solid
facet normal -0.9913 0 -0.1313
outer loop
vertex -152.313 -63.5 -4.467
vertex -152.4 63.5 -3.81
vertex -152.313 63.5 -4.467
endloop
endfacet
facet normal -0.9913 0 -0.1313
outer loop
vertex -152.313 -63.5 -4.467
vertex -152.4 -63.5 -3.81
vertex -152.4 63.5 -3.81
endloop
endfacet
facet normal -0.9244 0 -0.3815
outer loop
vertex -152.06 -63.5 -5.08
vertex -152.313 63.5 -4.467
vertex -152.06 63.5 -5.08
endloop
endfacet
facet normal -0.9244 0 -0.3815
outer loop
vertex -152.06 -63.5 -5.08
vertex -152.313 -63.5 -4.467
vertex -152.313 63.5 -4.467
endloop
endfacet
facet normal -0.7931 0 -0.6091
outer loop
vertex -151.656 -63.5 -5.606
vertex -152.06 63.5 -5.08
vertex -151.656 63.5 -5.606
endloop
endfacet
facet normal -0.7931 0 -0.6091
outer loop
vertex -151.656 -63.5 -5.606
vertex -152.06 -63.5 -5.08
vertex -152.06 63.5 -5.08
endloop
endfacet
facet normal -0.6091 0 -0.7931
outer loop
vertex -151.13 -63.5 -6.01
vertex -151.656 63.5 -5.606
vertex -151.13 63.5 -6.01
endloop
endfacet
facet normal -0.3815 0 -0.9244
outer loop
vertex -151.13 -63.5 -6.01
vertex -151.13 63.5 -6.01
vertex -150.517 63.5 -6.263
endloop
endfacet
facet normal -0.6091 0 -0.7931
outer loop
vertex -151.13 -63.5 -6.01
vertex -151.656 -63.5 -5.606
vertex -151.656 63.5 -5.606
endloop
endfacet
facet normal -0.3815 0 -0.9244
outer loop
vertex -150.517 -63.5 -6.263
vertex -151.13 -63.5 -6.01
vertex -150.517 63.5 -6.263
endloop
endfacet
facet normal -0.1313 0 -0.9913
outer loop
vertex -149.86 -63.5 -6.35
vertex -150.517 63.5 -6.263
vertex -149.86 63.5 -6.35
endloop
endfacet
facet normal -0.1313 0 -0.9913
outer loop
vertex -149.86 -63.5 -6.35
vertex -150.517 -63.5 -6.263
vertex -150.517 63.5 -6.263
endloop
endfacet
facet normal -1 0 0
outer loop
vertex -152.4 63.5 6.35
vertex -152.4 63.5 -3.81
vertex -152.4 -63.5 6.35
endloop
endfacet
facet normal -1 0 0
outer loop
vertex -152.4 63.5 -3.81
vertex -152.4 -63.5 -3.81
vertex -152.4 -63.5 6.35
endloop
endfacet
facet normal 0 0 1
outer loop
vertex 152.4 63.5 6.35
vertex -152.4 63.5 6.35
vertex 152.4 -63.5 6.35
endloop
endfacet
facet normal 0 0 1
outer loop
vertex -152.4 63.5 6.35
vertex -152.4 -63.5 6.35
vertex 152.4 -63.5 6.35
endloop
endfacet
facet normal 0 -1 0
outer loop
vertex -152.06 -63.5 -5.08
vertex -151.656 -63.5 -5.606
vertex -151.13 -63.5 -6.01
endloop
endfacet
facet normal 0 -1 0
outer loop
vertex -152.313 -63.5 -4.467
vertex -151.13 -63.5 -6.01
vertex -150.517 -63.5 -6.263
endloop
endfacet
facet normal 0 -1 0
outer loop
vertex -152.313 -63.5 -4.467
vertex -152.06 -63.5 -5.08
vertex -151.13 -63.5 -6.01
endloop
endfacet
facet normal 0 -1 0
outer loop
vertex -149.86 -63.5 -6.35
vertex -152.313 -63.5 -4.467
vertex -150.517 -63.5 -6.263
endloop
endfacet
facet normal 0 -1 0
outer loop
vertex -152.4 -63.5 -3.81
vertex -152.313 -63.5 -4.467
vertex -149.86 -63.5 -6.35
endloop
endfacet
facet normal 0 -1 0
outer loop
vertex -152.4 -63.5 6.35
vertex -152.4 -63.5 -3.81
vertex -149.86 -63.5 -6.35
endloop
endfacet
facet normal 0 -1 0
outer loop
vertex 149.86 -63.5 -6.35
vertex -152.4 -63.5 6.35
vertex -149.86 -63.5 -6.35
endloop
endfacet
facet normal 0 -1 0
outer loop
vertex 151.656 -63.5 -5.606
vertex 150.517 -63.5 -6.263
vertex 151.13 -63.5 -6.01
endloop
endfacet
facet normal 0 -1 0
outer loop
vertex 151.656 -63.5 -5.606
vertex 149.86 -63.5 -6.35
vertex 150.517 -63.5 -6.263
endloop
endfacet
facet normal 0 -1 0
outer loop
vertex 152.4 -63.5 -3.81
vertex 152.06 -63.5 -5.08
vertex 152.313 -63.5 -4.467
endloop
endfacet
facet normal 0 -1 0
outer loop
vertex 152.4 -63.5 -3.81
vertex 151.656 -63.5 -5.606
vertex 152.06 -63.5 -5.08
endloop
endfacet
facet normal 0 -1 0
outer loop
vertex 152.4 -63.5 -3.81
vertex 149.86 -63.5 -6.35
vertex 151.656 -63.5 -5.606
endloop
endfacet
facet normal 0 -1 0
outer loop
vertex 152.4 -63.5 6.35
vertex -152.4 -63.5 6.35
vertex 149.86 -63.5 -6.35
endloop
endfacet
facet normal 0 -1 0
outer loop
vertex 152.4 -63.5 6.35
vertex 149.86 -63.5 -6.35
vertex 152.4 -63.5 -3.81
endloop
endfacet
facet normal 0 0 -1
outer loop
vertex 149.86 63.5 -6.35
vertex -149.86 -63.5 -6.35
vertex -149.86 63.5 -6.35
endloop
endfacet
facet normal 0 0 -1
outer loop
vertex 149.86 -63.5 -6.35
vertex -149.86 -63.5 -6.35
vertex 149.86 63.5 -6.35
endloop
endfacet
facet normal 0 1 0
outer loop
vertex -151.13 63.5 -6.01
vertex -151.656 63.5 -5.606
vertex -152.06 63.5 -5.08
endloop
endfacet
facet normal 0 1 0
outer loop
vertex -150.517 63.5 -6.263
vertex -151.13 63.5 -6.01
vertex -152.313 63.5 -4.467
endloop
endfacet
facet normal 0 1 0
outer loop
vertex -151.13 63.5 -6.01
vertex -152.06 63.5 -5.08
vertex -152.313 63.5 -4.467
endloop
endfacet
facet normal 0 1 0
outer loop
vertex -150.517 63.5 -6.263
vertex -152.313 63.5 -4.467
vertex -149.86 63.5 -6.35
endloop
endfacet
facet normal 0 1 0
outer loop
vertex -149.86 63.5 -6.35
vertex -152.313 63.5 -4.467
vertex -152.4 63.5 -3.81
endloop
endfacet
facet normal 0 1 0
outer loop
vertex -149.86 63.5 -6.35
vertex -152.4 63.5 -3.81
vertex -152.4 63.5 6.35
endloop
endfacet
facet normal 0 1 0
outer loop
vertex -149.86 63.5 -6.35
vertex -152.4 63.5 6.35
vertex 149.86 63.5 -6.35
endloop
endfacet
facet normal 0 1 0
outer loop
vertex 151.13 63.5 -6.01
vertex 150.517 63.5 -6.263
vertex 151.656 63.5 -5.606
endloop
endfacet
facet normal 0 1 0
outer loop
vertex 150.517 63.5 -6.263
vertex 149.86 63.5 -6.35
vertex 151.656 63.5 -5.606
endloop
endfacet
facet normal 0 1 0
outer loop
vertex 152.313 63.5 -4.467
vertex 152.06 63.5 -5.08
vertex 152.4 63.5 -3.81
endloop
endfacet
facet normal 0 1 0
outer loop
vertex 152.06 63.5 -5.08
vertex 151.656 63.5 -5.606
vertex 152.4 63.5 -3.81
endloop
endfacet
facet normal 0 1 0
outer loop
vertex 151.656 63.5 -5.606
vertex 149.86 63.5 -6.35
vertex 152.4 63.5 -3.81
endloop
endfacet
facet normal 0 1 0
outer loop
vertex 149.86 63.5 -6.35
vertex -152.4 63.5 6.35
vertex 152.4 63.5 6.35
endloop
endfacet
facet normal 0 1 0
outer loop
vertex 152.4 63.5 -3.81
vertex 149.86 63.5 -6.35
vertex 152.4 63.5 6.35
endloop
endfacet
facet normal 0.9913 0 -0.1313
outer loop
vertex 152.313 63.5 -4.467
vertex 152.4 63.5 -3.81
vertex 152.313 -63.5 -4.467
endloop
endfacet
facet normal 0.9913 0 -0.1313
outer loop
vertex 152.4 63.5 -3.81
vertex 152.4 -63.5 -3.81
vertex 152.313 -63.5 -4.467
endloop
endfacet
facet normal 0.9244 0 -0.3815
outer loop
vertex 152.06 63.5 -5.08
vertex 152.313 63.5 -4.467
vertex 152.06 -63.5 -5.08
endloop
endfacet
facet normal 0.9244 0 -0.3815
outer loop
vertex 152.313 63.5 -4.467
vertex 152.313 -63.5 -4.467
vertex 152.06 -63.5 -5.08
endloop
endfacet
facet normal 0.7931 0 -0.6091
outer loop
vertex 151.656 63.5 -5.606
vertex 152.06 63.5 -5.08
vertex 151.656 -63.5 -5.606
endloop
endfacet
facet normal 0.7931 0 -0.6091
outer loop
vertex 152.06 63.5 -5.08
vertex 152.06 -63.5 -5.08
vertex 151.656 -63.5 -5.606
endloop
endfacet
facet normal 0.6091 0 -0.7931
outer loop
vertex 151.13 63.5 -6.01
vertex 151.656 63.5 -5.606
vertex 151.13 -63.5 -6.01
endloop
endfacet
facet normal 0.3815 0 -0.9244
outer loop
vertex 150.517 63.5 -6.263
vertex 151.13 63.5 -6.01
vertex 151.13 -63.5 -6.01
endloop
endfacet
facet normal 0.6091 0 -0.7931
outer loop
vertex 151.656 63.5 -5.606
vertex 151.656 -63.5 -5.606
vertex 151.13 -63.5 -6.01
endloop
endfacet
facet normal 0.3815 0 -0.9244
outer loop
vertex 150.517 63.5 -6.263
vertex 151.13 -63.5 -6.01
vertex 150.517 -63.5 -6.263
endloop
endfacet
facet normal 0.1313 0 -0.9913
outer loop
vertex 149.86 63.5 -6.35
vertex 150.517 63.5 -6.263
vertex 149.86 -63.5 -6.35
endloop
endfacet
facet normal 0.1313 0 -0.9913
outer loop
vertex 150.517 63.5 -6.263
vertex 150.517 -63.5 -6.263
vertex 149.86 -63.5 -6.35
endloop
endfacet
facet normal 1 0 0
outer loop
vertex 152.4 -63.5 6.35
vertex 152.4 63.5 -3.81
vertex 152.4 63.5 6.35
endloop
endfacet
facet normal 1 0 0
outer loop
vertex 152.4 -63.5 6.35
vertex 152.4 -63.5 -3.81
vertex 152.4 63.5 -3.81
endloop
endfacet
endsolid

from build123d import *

# Parameters (mm, degrees)
F0_W     = 304.8
F0_H     = 12.7
F1_DEPTH = 63.5
F2_R     = 2.54


with BuildPart() as f1:
    # F0 (on Front) → F1 (new body, symmetric)
    with BuildSketch(Plane.XZ):
        Rectangle(F0_W, F0_H)
    extrude(amount=F1_DEPTH, both=True)

    # F2
    f2_edges = [f1.edges().sort_by_distance(p)[0] for p in [
        (-152.4, 0, -6.35),
        (152.4, 0, -6.35),
    ]]
    fillet(f2_edges, radius=F2_R)


solid = f1.part
